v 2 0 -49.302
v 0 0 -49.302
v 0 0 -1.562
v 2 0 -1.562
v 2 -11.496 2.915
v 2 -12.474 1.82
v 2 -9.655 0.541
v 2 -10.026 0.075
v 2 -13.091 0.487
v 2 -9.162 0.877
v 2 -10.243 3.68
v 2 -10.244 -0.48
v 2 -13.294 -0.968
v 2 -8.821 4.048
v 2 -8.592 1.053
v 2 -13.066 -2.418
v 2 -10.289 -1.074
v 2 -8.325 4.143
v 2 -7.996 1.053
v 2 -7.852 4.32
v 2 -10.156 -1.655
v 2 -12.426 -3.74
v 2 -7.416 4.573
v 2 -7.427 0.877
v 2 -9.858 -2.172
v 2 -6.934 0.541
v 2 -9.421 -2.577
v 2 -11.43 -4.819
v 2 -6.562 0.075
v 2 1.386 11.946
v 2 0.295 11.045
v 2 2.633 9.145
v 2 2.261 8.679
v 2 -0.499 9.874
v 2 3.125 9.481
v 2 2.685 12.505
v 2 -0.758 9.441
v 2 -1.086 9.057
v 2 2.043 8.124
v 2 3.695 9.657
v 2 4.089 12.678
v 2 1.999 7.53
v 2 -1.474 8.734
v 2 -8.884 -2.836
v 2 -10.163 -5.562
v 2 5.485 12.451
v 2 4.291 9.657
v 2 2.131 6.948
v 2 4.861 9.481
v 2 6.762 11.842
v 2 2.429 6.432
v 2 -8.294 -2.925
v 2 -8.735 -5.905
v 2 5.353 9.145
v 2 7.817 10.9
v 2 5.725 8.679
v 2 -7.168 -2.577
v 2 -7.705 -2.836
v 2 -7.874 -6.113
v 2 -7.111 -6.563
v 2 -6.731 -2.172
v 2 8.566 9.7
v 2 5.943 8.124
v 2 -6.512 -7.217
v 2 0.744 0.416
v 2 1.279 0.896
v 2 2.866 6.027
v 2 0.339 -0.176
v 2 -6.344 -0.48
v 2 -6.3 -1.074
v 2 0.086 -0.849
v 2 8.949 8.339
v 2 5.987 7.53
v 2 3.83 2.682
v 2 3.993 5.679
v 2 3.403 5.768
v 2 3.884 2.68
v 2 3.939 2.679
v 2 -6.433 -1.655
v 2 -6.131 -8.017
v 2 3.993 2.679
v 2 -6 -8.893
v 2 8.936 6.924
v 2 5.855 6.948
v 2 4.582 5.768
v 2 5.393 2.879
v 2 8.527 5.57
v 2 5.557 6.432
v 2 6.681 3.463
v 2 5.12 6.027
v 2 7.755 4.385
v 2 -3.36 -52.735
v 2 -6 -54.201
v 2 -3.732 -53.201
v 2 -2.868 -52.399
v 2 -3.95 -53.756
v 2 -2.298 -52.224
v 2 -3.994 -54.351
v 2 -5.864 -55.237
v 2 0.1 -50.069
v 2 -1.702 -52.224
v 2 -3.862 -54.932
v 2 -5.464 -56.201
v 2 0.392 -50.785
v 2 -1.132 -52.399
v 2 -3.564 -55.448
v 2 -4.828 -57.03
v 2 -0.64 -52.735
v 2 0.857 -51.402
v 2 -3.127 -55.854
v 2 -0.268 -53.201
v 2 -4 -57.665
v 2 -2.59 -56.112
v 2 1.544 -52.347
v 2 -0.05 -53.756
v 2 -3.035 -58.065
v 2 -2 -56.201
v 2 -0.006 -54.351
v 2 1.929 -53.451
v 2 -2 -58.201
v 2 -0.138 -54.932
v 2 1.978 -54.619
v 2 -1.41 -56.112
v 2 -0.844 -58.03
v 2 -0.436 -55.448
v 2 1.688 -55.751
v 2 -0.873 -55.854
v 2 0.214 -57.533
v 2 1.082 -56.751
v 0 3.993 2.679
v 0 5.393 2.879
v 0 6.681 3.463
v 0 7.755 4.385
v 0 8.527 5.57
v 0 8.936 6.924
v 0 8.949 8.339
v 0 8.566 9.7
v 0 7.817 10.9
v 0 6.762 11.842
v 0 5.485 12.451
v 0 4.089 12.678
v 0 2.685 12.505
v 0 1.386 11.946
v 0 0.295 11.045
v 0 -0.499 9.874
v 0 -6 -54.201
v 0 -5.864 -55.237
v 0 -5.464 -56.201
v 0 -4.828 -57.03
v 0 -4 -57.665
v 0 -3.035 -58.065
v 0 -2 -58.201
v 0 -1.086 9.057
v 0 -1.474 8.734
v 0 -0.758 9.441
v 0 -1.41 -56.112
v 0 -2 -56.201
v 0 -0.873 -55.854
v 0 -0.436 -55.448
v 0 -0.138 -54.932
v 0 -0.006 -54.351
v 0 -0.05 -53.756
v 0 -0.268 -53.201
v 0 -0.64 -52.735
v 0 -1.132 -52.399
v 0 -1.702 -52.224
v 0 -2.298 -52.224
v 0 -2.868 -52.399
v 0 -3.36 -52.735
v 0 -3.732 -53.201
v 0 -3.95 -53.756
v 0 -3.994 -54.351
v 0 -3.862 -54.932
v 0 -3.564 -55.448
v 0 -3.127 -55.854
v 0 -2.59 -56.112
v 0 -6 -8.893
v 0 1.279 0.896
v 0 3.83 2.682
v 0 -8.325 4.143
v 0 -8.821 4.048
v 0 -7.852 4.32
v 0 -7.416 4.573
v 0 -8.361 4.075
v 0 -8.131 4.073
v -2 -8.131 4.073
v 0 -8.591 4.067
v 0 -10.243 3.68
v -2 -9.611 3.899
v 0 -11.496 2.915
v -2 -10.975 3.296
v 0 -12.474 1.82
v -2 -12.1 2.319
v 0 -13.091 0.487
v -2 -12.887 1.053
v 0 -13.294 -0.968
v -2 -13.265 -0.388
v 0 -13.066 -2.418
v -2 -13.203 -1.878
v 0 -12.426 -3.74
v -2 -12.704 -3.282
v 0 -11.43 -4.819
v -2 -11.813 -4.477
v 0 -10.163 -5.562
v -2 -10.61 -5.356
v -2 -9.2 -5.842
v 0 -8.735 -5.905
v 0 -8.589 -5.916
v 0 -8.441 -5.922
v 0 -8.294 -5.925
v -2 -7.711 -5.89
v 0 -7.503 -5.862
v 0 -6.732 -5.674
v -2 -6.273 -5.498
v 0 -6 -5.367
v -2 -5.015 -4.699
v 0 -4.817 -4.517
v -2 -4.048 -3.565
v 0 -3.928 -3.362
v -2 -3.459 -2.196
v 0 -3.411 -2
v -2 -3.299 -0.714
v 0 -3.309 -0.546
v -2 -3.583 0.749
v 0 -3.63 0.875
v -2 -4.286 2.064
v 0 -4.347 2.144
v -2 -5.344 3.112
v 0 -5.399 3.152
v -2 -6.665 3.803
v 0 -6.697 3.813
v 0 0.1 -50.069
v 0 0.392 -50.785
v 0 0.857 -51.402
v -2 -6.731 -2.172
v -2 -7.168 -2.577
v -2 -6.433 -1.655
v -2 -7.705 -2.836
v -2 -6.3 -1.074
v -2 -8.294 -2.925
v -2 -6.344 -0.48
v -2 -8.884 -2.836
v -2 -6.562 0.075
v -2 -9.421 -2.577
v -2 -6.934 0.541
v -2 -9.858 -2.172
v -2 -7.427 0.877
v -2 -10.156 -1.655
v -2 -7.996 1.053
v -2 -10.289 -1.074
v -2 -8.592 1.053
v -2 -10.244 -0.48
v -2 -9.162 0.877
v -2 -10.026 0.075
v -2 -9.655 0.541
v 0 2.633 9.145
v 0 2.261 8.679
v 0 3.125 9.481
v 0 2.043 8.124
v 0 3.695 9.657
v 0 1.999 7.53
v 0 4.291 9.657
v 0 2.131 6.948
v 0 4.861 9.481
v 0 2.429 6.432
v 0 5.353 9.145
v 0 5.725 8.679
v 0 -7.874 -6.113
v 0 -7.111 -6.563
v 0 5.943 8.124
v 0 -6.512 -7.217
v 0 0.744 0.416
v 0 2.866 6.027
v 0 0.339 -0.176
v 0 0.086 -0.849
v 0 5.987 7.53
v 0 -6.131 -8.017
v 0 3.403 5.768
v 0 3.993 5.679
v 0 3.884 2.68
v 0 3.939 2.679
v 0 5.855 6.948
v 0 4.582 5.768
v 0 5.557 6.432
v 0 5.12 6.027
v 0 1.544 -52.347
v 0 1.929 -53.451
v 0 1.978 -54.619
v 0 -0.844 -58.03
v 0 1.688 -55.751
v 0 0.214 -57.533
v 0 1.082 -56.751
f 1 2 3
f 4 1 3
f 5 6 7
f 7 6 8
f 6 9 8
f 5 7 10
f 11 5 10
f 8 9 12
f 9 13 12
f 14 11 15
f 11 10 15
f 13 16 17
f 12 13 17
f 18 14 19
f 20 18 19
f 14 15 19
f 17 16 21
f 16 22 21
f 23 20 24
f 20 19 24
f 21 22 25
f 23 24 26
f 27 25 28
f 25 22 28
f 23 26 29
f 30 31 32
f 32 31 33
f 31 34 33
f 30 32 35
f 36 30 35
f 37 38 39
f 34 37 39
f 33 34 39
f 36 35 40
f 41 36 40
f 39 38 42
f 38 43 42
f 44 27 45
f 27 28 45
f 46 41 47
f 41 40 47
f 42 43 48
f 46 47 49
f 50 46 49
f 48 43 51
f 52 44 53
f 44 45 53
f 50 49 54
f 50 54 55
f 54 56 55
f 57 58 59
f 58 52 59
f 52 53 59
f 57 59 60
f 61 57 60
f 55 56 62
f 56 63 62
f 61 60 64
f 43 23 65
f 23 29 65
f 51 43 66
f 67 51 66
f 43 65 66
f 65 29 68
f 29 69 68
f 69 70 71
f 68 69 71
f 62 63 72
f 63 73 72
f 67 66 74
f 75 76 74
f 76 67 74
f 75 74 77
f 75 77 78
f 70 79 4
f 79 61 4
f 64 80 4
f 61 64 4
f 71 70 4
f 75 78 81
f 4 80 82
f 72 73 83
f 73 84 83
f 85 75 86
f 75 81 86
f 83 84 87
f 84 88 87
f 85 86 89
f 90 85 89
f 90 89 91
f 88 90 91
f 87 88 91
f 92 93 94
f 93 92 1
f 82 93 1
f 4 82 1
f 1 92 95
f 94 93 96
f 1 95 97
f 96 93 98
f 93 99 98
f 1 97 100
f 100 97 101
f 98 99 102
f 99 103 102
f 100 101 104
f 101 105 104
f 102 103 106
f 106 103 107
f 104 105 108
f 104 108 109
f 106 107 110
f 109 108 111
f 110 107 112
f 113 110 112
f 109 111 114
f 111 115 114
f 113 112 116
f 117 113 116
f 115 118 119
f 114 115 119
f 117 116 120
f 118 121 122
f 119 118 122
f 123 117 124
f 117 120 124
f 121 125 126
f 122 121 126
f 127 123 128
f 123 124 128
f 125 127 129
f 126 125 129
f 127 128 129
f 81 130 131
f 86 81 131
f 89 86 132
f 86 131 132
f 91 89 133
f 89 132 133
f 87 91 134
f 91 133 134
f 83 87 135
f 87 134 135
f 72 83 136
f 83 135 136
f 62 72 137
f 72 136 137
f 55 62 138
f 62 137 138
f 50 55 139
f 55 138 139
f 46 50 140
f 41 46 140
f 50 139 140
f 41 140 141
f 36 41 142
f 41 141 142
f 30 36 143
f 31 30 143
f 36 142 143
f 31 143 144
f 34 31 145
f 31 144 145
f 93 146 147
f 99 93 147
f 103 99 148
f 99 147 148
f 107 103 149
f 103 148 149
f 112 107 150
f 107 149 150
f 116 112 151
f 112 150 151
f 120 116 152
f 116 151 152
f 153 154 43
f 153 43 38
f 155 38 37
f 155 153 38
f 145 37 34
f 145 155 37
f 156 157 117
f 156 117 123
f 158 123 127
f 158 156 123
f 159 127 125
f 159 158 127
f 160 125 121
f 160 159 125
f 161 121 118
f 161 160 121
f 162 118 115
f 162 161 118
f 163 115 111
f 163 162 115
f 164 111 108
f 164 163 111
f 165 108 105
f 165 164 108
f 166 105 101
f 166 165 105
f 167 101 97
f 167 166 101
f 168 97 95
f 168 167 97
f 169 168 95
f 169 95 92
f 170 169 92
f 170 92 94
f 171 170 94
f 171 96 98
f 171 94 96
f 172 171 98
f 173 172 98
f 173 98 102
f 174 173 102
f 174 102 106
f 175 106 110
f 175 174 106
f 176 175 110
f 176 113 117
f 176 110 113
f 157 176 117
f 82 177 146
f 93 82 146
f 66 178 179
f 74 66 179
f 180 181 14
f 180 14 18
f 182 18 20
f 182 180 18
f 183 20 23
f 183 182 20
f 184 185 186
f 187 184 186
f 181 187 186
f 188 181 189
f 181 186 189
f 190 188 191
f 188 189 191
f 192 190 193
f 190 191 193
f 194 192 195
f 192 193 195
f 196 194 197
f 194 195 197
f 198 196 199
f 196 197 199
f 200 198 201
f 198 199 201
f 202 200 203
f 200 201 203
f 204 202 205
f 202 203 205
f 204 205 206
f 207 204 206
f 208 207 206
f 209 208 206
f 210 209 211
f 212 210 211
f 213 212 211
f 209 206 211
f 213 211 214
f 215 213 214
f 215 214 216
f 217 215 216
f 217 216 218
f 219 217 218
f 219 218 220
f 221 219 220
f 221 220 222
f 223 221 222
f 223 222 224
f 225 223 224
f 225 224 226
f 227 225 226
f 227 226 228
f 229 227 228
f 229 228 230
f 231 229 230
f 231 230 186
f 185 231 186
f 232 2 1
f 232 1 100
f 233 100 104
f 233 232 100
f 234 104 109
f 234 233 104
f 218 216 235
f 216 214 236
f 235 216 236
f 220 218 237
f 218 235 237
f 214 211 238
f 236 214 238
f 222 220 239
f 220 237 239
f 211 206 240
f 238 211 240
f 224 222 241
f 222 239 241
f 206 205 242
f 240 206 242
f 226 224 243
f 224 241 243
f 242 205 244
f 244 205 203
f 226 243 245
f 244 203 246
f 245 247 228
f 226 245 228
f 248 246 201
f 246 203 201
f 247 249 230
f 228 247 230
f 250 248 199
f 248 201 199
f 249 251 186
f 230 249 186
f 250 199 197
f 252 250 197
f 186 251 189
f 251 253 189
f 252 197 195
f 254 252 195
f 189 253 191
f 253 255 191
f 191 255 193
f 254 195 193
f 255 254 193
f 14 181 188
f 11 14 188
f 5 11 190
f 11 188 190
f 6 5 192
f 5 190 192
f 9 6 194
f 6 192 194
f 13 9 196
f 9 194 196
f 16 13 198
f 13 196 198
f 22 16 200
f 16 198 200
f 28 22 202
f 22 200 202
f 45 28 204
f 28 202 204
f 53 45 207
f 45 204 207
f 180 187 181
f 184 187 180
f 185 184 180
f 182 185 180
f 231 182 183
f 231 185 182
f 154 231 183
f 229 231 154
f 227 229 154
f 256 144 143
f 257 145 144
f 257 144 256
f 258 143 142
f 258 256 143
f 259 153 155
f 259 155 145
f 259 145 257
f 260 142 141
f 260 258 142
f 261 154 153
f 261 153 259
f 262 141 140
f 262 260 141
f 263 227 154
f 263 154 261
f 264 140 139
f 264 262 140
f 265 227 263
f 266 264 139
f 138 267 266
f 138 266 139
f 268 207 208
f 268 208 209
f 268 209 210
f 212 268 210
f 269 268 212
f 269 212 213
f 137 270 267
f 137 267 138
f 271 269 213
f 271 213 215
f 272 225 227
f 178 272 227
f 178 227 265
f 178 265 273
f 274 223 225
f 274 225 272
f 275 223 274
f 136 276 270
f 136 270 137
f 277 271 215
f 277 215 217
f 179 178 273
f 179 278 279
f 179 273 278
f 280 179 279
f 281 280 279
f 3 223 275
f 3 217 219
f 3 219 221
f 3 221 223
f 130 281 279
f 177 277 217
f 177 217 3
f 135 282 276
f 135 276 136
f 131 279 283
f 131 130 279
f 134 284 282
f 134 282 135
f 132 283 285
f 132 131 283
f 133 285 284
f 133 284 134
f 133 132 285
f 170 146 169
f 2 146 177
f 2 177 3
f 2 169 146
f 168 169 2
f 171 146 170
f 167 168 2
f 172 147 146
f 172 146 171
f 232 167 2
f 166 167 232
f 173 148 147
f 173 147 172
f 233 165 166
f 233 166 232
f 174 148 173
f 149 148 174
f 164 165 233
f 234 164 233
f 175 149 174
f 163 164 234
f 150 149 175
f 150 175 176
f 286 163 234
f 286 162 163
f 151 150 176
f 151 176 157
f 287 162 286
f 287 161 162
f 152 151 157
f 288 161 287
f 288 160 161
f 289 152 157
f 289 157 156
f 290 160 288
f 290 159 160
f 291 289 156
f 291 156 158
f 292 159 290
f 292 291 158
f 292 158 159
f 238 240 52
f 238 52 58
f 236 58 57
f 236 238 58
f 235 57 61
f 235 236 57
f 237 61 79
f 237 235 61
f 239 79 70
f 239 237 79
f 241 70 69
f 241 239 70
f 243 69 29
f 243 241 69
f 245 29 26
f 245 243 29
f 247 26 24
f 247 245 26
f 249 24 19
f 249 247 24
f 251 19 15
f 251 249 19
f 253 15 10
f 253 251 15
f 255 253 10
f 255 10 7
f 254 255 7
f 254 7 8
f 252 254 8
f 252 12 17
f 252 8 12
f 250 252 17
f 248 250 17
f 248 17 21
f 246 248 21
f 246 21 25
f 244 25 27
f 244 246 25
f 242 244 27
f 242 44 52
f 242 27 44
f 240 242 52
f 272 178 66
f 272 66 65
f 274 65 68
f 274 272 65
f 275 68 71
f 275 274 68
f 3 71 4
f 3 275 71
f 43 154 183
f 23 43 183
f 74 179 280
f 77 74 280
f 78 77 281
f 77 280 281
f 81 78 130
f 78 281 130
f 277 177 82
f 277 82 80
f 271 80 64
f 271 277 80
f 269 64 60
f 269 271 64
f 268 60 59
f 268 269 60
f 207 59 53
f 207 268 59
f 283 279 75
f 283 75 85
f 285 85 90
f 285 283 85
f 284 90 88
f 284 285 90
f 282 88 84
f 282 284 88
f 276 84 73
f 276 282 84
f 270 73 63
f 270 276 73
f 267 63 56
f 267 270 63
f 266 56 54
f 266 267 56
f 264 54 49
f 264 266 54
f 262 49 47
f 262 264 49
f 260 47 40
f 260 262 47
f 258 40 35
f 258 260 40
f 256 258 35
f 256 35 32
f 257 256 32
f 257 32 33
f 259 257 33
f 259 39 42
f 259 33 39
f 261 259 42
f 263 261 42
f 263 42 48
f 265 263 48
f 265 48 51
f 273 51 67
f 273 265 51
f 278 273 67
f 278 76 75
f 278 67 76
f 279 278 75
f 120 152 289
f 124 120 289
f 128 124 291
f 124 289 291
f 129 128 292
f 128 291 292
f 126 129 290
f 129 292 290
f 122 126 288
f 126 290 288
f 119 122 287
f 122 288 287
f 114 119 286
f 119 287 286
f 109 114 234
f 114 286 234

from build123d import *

# Parameters (mm, degrees)
EXTRUDE_1_DEPTH          = 2
EXTRUDE_START            = -2
SKETCH_1_4_R             = 5
EXTRUDE_2_DEPTH          = 2
CUT_EXTRUDE_1_DEPTH      = 60.733771951
CUT_EXTRUDE_1_DEPTH_BACK = 60.733771951
SKETCH_1_3_R             = 2
FILLET_1_R               = 3


with BuildPart() as part:
    # 草图1 → 凸台-拉伸1 (new body)
    with BuildSketch(Plane(origin=(0, 0, 0), x_dir=(0, 0, -1), z_dir=(1, 0, 0))):
        with BuildLine():
            Line((50.737143614, 0), (0, 0))
            Line((0, 0), (2.48051592, -3.542543867))
            ThreePointArc((2.48051592, -3.542543867), (4.165783411, -4.487079684), (5.367176995, -6))
            Line((5.367176995, -6), (54.201245229, -6))
            ThreePointArc((54.201245229, -6), (50.737143614, -4), (50.737143614, 0))
        make_face()
        with BuildLine():
            Line((2.48051592, -3.542543867), (0, 0))
            Line((0, 0), (-2.681672007, 3.829824531))
            ThreePointArc((-2.681672007, 3.829824531), (-4.811127311, -0.102785303), (-9.234888361, -0.758786959))
            Line((-9.234888361, -0.758786959), (-4.072700434, -8.131155358))
            ThreePointArc((-4.072700434, -8.131155358), (-1.94324513, -4.198545524), (2.48051592, -3.542543867))
        make_face()
        with BuildLine():
            ThreePointArc((58.201245229, -2), (55.23652141, 1.863703305), (50.737143614, 0))
            Line((50.737143614, 0), (54.201245229, 0))
            ThreePointArc((54.201245229, 0), (55.615458792, -0.585786438), (56.201245229, -2))
            ThreePointArc((56.201245229, -2), (55.615458792, -3.414213562), (54.201245229, -4))
            Line((54.201245229, -4), (54.201245229, -6))
            ThreePointArc((54.201245229, -6), (57.029672354, -4.828427125), (58.201245229, -2))
        make_face()
        with BuildLine():
            Line((54.201245229, 0), (50.737143614, 0))
            ThreePointArc((50.737143614, 0), (50.737143614, -4), (54.201245229, -6))
            Line((54.201245229, -6), (54.201245229, -4))
            ThreePointArc((54.201245229, -4), (52.201245229, -2), (54.201245229, 0))
        make_face()
        with BuildLine():
            ThreePointArc((5.367176995, -6), (4.165783411, -4.487079684), (2.48051592, -3.542543867))
            Line((2.48051592, -3.542543867), (4.201245229, -6))
            Line((4.201245229, -6), (5.367176995, -6))
        make_face()
        with BuildLine():
            Line((4.201245229, -6), (2.48051592, -3.542543867))
            ThreePointArc((2.48051592, -3.542543867), (-1.94324513, -4.198545524), (-4.072700434, -8.131155358))
            Line((-4.072700434, -8.131155358), (-2.351971125, -10.588611491))
            Line((-2.351971125, -10.588611491), (-0.713667036, -9.441458618))
            ThreePointArc((-0.713667036, -9.441458618), (-0.222515821, -6.656001657), (2.562941141, -7.147152873))
            Line((2.562941141, -7.147152873), (4.201245229, -6))
        make_face()
        with BuildLine():
            ThreePointArc((-9.234888361, -0.758786959), (-4.811127311, -0.102785303), (-2.681672007, 3.829824531))
            Line((-2.681672007, 3.829824531), (-4.402401316, 6.287280664))
            Line((-4.402401316, 6.287280664), (-6.040705405, 5.140127792))
            ThreePointArc((-6.040705405, 5.140127792), (-5.771575592, 4.594386518), (-5.679009493, 3.992974919))
            ThreePointArc((-5.679009493, 3.992974919), (-7.077597894, 2.085541017), (-9.317313582, 2.845822046))
            Line((-9.317313582, 2.845822046), (-10.95561767, 1.698669174))
            Line((-10.95561767, 1.698669174), (-9.234888361, -0.758786959))
        make_face()
        with BuildLine():
            Line((-4.402401316, 6.287280664), (-2.681672007, 3.829824531))
            ThreePointArc((-2.681672007, 3.829824531), (-2.679675166, 3.911388863), (-2.679009493, 3.992974919))
            ThreePointArc((-2.679009493, 3.992974919), (-10.613341245, 8.041394014), (-9.234888361, -0.758786959))
            Line((-9.234888361, -0.758786959), (-10.95561767, 1.698669174))
            Line((-10.95561767, 1.698669174), (-9.317313582, 2.845822046))
            ThreePointArc((-9.317313582, 2.845822046), (-8.826162366, 5.631279008), (-6.040705405, 5.140127792))
            Line((-6.040705405, 5.140127792), (-4.402401316, 6.287280664))
        make_face()
        with BuildLine():
            ThreePointArc((56.201245229, -2), (55.615458792, -0.585786438), (54.201245229, 0))
            Line((54.201245229, 0), (54.201245229, -4))
            ThreePointArc((54.201245229, -4), (55.615458792, -3.414213562), (56.201245229, -2))
        make_face()
        with BuildLine():
            Line((54.201245229, -4), (54.201245229, 0))
            ThreePointArc((54.201245229, 0), (52.201245229, -2), (54.201245229, -4))
        make_face()
        with BuildLine():
            Line((5.367176995, -6), (4.201245229, -6))
            Line((4.201245229, -6), (2.562941141, -7.147152873))
            ThreePointArc((2.562941141, -7.147152873), (2.832070954, -7.692894146), (2.924637052, -8.294305745))
            ThreePointArc((2.924637052, -8.294305745), (1.526048651, -10.201739647), (-0.713667036, -9.441458618))
            Line((-0.713667036, -9.441458618), (-2.351971125, -10.588611491))
            Line((-2.351971125, -10.588611491), (-4.072700434, -8.131155358))
            ThreePointArc((-4.072700434, -8.131155358), (0.843050996, -13.293640073), (5.924637052, -8.294305745))
            ThreePointArc((5.924637052, -8.294305745), (5.783273678, -7.113776143), (5.367176995, -6))
        make_face()
        with BuildLine():
            ThreePointArc((2.924637052, -8.294305745), (2.832070954, -7.692894146), (2.562941141, -7.147152873))
            Line((2.562941141, -7.147152873), (-0.713667036, -9.441458618))
            ThreePointArc((-0.713667036, -9.441458618), (1.526048651, -10.201739647), (2.924637052, -8.294305745))
        make_face()
        with BuildLine():
            Line((-0.713667036, -9.441458618), (2.562941141, -7.147152873))
            ThreePointArc((2.562941141, -7.147152873), (-0.222515821, -6.656001657), (-0.713667036, -9.441458618))
        make_face()
        with BuildLine():
            ThreePointArc((-5.679009493, 3.992974919), (-5.771575592, 4.594386518), (-6.040705405, 5.140127792))
            Line((-6.040705405, 5.140127792), (-9.317313582, 2.845822046))
            ThreePointArc((-9.317313582, 2.845822046), (-7.077597894, 2.085541017), (-5.679009493, 3.992974919))
        make_face()
        with BuildLine():
            Line((-9.317313582, 2.845822046), (-6.040705405, 5.140127792))
            ThreePointArc((-6.040705405, 5.140127792), (-8.826162366, 5.631279008), (-9.317313582, 2.845822046))
        make_face()
    extrude(amount=EXTRUDE_1_DEPTH)

    # 草图1<4> → 凸台-拉伸2 (add)
    with BuildSketch(Plane(origin=(0, 0, 0), x_dir=(0, 0, -1), z_dir=(1, 0, 0)).offset(EXTRUDE_START)):
        with Locations(Location((0.924637052, -8.294305745, 0), (0, 0, 178.130102354))):
            Circle(SKETCH_1_4_R)
    extrude(amount=EXTRUDE_2_DEPTH)

    # 草图1<3> → 切除-拉伸1 (cut, two sides: drawn at the far end of the back side and taken through both)
    with BuildSketch(Plane(origin=(0, 0, 0), x_dir=(0, 0, -1), z_dir=(1, 0, 0)).offset(-CUT_EXTRUDE_1_DEPTH_BACK)):
        with Locations((-7.679009493, 3.992974919)):
            Circle(SKETCH_1_3_R)
        with Locations((54.201245229, -2)):
            Circle(SKETCH_1_3_R)
        with Locations((0.924637052, -8.294305745)):
            Circle(SKETCH_1_3_R)
    extrude(amount=CUT_EXTRUDE_1_DEPTH + CUT_EXTRUDE_1_DEPTH_BACK, mode=Mode.SUBTRACT)

    # 圆角1
    # the kernel refuses this fillet: 3 mm, written as the material it adds along each edge
    with BuildSketch(Plane(origin=(0, -6, -5.367176995), x_dir=(0, 0, -1), z_dir=(1, 0, 0))) as fillet_1_piece_1:
        with BuildLine():
            CenterArc((3.526273997, -3), FILLET_1_R, 90, 84.939259464)
            ThreePointArc((0.53796877, -2.735364655), (0.463478447, -1.329430853), (0, 0))
            Line((0, 0), (3.526273997, 0))
        make_face()
    extrude(amount=2)
    with BuildSketch(Plane(origin=(0, 0, 0), x_dir=(0, 0, -1), z_dir=(1, 0, 0))) as fillet_1_piece_2:
        with BuildLine():
            CenterArc((FILLET_1_R * 0.520567050552, FILLET_1_R), FILLET_1_R, 215, 55)
            Line((-FILLET_1_R * 0.298584993737, FILLET_1_R * 0.426423563649), (0, 0))
            Line((0, 0), (FILLET_1_R * 0.520567050552, 0))
        make_face()
    extrude(amount=2)
    with BuildSketch(Plane(origin=(0, 0, -50.737143614), x_dir=(0, 0.7902368852402493, -0.6128014892326789), z_dir=(1, 0, 0))) as fillet_1_piece_3:
        with BuildLine():
            CenterArc((1.49141536, 2.972297887), FILLET_1_R, 217.792345701, 44.415308597)
            Line((-0.879295296, 1.133893419), (0, 0))
            ThreePointArc((0, 0), (0.542332858, 0.036936151), (1.084665716, 0))
        make_face()
    extrude(amount=2)
    with BuildSketch(Plane(origin=(0, -0.758786959, 9.234888361), x_dir=(0, -0.8191520442889745, -0.5735764363510707), z_dir=(1, 0, 0))) as fillet_1_piece_4:
        with BuildLine():
            CenterArc((0.872983346, -3), FILLET_1_R, 90, 28.955024372)
            ThreePointArc((-0.579385409, -0.375), (-0.283214788, -0.19750856), (0, 0))
            Line((0, 0), (0.872983346, 0))
        make_face()
    extrude(amount=2)
    with BuildSketch(Plane(origin=(0, -8.131155358, 4.072700434), x_dir=(0, -0.9993363396246481, -0.03642636827368134), z_dir=(1, 0, 0))) as fillet_1_piece_5:
        with BuildLine():
            CenterArc((0.897200113, -2.992846785), FILLET_1_R, 93.957436637, 28.955024372)
            Line((-0.732871014, -0.474341649), (0, 0))
            ThreePointArc((0, 0), (0.345076967, -0.011922025), (0.690153933, 0))
        make_face()
    extrude(amount=2)


solid = part.part
